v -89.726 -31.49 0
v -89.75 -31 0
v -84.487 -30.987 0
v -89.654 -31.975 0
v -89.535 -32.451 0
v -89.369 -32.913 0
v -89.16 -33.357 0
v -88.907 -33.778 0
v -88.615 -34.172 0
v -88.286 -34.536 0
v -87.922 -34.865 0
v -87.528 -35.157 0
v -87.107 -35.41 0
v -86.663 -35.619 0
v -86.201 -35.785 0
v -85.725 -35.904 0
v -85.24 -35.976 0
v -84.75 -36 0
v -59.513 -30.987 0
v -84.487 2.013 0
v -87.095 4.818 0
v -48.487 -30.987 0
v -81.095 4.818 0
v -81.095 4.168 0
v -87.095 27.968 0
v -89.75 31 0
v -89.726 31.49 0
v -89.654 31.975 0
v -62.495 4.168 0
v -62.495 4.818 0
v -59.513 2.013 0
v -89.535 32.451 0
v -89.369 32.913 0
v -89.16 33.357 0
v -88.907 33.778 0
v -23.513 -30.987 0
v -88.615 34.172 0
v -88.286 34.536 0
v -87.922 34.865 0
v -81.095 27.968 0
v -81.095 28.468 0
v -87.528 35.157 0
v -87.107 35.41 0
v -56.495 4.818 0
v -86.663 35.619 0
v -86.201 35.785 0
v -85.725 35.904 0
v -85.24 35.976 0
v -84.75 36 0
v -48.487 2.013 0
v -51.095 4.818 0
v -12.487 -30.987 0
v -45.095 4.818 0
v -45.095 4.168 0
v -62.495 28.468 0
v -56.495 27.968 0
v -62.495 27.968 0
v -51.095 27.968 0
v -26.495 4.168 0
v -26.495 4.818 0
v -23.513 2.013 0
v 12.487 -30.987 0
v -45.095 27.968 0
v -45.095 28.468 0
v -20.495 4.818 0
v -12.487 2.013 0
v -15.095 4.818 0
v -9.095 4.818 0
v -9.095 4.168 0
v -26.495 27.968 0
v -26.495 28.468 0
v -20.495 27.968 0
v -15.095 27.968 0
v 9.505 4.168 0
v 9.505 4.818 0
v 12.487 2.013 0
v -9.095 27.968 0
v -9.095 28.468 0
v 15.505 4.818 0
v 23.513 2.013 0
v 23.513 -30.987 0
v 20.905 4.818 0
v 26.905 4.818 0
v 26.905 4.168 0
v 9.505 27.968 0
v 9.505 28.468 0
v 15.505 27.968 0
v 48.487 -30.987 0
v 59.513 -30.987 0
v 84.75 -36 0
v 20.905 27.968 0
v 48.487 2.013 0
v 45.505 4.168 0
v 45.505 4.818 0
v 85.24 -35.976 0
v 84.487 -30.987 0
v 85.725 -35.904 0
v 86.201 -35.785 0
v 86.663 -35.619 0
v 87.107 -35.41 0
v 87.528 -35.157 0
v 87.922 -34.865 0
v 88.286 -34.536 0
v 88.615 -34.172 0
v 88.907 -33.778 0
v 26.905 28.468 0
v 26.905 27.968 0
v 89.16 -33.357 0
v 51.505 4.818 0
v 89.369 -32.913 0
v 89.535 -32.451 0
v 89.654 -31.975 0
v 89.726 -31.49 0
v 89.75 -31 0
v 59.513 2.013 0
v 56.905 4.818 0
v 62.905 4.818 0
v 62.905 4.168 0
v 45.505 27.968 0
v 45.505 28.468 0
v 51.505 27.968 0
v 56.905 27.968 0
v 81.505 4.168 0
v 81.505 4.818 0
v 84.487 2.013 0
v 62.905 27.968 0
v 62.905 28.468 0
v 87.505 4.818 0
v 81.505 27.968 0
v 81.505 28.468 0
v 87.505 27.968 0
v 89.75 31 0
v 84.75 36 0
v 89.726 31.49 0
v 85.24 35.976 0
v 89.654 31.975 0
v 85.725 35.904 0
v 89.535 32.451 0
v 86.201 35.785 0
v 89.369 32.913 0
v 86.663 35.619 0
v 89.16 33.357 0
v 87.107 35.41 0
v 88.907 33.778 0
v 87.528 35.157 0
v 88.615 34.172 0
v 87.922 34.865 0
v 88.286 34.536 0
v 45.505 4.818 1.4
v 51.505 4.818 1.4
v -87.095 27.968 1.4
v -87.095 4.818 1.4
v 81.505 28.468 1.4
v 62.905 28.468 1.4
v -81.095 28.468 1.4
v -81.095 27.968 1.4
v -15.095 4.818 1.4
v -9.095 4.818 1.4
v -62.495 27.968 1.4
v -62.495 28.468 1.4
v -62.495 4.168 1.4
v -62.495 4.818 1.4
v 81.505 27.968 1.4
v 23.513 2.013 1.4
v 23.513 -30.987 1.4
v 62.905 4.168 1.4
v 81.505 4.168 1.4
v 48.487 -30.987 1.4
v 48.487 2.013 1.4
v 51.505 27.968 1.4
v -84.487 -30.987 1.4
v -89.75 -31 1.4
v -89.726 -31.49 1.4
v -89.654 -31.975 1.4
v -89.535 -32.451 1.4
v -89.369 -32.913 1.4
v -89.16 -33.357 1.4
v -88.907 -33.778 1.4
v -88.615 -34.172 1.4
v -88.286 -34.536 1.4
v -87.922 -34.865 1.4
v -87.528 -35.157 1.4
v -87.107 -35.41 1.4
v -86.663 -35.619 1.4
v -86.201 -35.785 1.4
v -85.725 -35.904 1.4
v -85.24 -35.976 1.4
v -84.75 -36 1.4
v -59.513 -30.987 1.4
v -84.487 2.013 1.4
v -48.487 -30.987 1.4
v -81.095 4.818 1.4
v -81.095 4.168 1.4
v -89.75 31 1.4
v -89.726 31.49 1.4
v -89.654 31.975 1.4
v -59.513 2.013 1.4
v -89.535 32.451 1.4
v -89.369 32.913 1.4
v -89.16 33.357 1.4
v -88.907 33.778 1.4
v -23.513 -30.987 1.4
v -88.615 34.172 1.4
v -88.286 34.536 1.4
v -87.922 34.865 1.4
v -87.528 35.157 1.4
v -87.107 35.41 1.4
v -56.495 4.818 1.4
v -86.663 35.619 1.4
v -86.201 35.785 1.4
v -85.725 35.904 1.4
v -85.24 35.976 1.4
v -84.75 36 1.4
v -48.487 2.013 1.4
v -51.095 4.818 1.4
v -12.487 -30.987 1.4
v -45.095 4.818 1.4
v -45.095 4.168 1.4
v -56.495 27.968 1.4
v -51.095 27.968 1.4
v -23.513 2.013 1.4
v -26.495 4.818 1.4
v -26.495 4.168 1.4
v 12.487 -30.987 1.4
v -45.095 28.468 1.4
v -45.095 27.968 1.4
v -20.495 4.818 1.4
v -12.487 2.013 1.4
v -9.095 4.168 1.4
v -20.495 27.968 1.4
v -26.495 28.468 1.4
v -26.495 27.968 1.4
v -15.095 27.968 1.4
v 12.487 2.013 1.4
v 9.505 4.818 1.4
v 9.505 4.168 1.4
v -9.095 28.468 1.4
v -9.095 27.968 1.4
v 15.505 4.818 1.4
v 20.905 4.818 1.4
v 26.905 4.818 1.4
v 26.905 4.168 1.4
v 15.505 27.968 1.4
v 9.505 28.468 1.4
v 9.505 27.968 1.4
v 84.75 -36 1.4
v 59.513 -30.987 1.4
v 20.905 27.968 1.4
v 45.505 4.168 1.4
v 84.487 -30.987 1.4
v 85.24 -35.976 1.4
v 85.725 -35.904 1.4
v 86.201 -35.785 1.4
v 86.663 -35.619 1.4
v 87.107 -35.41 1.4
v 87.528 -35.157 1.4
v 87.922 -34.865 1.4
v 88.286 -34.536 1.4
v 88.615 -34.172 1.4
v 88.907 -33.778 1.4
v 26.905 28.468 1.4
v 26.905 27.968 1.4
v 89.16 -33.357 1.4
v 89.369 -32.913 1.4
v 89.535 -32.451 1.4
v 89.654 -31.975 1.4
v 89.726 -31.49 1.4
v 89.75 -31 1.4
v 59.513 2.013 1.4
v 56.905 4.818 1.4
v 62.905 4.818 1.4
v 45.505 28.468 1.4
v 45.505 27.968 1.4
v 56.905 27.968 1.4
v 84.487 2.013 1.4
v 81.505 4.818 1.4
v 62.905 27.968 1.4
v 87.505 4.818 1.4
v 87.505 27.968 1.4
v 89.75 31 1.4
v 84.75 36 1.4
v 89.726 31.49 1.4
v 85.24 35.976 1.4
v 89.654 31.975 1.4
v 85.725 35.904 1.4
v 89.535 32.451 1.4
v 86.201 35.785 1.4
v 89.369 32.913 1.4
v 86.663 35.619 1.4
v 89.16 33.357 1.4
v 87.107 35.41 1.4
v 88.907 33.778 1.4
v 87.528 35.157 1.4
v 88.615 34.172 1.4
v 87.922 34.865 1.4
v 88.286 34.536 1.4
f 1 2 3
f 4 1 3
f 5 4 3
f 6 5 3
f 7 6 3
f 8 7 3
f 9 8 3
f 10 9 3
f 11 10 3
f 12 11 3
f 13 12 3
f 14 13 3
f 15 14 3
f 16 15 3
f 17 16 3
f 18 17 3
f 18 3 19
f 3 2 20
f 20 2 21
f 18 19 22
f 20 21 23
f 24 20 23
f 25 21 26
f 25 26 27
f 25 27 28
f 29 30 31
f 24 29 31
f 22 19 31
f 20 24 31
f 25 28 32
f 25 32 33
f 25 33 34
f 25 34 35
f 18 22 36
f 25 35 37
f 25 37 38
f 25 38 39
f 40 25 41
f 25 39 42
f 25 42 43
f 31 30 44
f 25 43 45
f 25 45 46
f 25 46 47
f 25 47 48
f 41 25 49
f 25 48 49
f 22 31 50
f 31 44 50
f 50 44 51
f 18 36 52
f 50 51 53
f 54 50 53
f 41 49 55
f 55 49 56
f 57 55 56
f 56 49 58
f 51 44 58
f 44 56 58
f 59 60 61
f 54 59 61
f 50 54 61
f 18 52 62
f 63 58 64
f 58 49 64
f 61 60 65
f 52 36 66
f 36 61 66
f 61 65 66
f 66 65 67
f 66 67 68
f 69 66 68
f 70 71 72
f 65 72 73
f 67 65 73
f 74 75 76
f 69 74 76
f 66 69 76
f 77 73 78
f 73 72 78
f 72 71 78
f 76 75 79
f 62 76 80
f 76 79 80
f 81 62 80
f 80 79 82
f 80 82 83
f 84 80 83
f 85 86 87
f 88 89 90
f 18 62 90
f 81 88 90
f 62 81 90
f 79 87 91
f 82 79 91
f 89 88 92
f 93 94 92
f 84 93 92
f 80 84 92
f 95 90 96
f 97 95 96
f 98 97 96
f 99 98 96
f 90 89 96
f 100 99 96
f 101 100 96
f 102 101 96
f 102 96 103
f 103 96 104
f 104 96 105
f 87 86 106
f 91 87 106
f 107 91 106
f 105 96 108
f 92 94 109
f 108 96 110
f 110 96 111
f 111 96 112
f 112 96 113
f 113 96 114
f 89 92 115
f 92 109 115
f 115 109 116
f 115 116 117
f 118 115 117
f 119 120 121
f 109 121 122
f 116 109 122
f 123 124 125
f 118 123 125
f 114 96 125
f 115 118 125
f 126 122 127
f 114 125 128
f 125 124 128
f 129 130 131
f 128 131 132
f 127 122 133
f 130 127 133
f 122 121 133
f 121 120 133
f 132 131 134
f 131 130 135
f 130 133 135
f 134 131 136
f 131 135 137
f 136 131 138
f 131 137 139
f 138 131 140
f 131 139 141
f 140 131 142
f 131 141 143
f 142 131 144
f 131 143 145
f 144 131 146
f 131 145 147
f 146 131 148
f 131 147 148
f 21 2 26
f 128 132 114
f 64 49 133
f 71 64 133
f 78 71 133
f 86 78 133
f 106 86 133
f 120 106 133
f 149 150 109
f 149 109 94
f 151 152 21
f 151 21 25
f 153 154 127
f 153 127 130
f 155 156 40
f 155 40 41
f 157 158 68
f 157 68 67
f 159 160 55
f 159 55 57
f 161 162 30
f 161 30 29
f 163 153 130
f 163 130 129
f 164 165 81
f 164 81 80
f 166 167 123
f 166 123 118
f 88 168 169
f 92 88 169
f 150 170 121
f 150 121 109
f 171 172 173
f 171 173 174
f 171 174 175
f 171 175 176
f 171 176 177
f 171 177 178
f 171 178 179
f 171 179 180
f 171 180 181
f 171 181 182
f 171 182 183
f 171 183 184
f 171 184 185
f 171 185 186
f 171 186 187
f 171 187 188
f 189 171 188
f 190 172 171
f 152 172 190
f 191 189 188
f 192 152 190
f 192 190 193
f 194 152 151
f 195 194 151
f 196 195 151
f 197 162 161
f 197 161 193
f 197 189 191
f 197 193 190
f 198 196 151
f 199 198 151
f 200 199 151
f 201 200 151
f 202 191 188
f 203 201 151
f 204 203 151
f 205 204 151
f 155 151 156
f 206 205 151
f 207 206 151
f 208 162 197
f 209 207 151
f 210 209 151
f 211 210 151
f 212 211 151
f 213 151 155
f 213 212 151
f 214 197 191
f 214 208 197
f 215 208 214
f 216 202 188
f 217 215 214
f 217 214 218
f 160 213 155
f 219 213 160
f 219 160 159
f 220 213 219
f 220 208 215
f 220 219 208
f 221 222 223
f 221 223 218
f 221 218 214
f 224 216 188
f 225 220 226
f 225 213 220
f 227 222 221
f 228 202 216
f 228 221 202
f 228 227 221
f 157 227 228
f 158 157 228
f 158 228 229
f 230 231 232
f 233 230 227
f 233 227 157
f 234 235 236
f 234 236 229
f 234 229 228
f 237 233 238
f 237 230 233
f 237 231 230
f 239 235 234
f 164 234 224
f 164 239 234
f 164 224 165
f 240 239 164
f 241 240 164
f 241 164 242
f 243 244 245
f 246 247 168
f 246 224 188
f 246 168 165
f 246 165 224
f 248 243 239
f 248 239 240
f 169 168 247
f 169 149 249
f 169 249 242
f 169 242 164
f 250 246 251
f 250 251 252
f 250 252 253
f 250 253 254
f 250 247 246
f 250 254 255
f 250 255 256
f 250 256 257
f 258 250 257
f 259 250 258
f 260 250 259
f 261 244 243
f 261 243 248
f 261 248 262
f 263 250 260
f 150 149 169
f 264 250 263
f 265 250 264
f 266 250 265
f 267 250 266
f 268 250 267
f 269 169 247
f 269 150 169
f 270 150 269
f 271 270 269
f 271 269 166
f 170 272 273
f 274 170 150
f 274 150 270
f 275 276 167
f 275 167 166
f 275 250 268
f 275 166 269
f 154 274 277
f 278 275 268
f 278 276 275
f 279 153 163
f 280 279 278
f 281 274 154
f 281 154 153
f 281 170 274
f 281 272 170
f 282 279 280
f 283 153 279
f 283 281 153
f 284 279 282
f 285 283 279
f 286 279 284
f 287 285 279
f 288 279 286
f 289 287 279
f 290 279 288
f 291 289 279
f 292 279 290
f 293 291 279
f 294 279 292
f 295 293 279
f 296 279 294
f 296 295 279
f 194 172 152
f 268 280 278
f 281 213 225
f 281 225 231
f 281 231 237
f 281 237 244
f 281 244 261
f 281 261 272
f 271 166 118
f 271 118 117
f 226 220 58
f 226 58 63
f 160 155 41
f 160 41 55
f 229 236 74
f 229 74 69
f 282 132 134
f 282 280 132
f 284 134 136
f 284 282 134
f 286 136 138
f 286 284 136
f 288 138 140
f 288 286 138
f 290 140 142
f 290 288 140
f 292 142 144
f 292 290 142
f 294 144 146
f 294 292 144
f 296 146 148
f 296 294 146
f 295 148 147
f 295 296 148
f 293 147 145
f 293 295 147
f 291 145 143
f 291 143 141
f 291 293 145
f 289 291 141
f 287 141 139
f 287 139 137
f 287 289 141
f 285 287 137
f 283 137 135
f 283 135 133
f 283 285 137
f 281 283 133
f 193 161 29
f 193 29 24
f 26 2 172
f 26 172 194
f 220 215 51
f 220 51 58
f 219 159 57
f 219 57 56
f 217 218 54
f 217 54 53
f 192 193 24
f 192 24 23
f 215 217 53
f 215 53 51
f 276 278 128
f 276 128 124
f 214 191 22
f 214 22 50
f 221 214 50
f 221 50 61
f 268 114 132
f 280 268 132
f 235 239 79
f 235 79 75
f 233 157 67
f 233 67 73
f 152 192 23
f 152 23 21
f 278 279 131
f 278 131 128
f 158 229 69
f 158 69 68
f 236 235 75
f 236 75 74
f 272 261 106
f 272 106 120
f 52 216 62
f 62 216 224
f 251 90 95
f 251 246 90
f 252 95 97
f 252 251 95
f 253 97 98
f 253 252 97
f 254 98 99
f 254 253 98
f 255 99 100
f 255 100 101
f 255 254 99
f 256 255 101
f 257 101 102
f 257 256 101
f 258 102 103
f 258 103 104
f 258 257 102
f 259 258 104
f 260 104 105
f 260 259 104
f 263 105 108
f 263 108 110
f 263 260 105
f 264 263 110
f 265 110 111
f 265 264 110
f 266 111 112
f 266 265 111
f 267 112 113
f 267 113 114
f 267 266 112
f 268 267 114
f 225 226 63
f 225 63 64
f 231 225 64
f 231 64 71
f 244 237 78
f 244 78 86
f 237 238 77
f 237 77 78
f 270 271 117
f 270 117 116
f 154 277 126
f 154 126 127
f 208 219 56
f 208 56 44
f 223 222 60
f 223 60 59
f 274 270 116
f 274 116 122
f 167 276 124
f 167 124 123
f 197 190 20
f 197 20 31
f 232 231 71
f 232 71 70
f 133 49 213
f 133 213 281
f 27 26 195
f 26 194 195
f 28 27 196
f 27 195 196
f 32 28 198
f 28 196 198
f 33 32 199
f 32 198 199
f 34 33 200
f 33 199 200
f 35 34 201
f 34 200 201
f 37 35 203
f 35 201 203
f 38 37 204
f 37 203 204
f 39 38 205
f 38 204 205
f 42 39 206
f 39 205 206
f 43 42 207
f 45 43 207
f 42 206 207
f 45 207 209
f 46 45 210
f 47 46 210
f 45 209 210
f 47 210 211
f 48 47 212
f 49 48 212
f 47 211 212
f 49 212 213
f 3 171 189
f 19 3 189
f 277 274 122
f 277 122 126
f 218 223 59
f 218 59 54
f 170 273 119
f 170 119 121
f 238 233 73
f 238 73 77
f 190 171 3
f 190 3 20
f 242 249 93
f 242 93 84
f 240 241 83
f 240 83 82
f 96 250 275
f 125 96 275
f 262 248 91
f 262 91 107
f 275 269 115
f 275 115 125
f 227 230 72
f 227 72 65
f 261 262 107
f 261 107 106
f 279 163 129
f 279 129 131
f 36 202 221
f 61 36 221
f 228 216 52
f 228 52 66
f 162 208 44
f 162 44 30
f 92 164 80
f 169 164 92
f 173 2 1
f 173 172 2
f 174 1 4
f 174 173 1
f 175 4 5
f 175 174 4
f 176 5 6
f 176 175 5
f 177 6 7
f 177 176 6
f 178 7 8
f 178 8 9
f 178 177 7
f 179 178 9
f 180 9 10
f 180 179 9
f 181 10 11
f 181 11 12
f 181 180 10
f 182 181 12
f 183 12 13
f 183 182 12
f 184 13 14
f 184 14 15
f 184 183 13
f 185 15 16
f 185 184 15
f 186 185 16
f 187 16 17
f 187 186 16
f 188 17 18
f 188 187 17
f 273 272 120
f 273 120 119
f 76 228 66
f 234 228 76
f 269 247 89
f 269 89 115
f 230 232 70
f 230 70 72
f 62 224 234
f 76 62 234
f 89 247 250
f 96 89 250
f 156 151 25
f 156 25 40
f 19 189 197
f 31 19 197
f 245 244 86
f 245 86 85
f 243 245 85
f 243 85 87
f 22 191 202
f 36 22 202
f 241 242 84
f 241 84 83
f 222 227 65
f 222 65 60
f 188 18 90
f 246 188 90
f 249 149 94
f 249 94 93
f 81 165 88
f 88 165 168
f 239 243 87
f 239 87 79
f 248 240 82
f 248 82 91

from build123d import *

# Parameters (mm, degrees)
SKIZZE1_W                       = 179.5
SKIZZE1_H                       = 72
AUFSATZ_LINEAR_AUSTRAGEN1_DEPTH = 1.4
VERRUNDUNG1_R                   = 5
SKIZZE2_W                       = 24.97465075
SKIZZE2_H                       = 33
SCHNITT_LINEAR_AUSTRAGEN1_DEPTH = 97.711025742
SCHNITT_LINEAR_AUSTRAGEN2_DEPTH = 97.711025742
LINEARES_MUSTER1_COUNT          = 5
LINEARES_MUSTER1_PITCH          = 36


with BuildPart() as part:
    # Skizze1 → Aufsatz-Linear austragen1 (new body)
    with BuildSketch(Plane.XY):
        Rectangle(SKIZZE1_W, SKIZZE1_H)
    extrude(amount=AUFSATZ_LINEAR_AUSTRAGEN1_DEPTH)

    # Verrundung1
    verrundung1_edges = [part.edges().sort_by_distance(p)[0] for p in [
        (89.75, -36, 0.7),
        (-89.75, -36, 0.7),
        (-89.75, 36, 0.7),
        (89.75, 36, 0.7),
    ]]
    fillet(verrundung1_edges, radius=VERRUNDUNG1_R)

    # Skizze2 → Schnitt-Linear austragen1 (cut, through all)
    with BuildSketch(Plane.XY.offset(1.4)):
        with Locations((72, -14.487360935)):
            Rectangle(SKIZZE2_W, SKIZZE2_H)
    schnitt_linear_austragen1 = extrude(amount=-SCHNITT_LINEAR_AUSTRAGEN1_DEPTH, mode=Mode.SUBTRACT)

    # Skizze3 → Schnitt-Linear austragen2 (cut, through all)
    with BuildSketch(Plane.XY.offset(1.4)):
        Polygon((62.905000508, 28.468009652), (81.505000508, 28.468009652), (81.505000508, 27.968009652), (87.505000508, 27.968009652), (87.505000508, 4.818009652), (81.505000508, 4.818009652), (81.505000508, 4.168009652), (62.905000508, 4.168009652), (62.905000508, 4.818009652), (56.905000508, 4.818009652), (56.905000508, 27.968009652), (62.905000508, 27.968009652), align=None)
    schnitt_linear_austragen2 = extrude(amount=-SCHNITT_LINEAR_AUSTRAGEN2_DEPTH, mode=Mode.SUBTRACT)

    # Lineares Muster1: Schnitt-Linear austragen1, Schnitt-Linear austragen2 ×5
    with Locations(*[(-i * LINEARES_MUSTER1_PITCH, 0, 0) for i in range(1, LINEARES_MUSTER1_COUNT)]):
        add(schnitt_linear_austragen1, mode=Mode.SUBTRACT)
        add(schnitt_linear_austragen2, mode=Mode.SUBTRACT)


solid = part.part
